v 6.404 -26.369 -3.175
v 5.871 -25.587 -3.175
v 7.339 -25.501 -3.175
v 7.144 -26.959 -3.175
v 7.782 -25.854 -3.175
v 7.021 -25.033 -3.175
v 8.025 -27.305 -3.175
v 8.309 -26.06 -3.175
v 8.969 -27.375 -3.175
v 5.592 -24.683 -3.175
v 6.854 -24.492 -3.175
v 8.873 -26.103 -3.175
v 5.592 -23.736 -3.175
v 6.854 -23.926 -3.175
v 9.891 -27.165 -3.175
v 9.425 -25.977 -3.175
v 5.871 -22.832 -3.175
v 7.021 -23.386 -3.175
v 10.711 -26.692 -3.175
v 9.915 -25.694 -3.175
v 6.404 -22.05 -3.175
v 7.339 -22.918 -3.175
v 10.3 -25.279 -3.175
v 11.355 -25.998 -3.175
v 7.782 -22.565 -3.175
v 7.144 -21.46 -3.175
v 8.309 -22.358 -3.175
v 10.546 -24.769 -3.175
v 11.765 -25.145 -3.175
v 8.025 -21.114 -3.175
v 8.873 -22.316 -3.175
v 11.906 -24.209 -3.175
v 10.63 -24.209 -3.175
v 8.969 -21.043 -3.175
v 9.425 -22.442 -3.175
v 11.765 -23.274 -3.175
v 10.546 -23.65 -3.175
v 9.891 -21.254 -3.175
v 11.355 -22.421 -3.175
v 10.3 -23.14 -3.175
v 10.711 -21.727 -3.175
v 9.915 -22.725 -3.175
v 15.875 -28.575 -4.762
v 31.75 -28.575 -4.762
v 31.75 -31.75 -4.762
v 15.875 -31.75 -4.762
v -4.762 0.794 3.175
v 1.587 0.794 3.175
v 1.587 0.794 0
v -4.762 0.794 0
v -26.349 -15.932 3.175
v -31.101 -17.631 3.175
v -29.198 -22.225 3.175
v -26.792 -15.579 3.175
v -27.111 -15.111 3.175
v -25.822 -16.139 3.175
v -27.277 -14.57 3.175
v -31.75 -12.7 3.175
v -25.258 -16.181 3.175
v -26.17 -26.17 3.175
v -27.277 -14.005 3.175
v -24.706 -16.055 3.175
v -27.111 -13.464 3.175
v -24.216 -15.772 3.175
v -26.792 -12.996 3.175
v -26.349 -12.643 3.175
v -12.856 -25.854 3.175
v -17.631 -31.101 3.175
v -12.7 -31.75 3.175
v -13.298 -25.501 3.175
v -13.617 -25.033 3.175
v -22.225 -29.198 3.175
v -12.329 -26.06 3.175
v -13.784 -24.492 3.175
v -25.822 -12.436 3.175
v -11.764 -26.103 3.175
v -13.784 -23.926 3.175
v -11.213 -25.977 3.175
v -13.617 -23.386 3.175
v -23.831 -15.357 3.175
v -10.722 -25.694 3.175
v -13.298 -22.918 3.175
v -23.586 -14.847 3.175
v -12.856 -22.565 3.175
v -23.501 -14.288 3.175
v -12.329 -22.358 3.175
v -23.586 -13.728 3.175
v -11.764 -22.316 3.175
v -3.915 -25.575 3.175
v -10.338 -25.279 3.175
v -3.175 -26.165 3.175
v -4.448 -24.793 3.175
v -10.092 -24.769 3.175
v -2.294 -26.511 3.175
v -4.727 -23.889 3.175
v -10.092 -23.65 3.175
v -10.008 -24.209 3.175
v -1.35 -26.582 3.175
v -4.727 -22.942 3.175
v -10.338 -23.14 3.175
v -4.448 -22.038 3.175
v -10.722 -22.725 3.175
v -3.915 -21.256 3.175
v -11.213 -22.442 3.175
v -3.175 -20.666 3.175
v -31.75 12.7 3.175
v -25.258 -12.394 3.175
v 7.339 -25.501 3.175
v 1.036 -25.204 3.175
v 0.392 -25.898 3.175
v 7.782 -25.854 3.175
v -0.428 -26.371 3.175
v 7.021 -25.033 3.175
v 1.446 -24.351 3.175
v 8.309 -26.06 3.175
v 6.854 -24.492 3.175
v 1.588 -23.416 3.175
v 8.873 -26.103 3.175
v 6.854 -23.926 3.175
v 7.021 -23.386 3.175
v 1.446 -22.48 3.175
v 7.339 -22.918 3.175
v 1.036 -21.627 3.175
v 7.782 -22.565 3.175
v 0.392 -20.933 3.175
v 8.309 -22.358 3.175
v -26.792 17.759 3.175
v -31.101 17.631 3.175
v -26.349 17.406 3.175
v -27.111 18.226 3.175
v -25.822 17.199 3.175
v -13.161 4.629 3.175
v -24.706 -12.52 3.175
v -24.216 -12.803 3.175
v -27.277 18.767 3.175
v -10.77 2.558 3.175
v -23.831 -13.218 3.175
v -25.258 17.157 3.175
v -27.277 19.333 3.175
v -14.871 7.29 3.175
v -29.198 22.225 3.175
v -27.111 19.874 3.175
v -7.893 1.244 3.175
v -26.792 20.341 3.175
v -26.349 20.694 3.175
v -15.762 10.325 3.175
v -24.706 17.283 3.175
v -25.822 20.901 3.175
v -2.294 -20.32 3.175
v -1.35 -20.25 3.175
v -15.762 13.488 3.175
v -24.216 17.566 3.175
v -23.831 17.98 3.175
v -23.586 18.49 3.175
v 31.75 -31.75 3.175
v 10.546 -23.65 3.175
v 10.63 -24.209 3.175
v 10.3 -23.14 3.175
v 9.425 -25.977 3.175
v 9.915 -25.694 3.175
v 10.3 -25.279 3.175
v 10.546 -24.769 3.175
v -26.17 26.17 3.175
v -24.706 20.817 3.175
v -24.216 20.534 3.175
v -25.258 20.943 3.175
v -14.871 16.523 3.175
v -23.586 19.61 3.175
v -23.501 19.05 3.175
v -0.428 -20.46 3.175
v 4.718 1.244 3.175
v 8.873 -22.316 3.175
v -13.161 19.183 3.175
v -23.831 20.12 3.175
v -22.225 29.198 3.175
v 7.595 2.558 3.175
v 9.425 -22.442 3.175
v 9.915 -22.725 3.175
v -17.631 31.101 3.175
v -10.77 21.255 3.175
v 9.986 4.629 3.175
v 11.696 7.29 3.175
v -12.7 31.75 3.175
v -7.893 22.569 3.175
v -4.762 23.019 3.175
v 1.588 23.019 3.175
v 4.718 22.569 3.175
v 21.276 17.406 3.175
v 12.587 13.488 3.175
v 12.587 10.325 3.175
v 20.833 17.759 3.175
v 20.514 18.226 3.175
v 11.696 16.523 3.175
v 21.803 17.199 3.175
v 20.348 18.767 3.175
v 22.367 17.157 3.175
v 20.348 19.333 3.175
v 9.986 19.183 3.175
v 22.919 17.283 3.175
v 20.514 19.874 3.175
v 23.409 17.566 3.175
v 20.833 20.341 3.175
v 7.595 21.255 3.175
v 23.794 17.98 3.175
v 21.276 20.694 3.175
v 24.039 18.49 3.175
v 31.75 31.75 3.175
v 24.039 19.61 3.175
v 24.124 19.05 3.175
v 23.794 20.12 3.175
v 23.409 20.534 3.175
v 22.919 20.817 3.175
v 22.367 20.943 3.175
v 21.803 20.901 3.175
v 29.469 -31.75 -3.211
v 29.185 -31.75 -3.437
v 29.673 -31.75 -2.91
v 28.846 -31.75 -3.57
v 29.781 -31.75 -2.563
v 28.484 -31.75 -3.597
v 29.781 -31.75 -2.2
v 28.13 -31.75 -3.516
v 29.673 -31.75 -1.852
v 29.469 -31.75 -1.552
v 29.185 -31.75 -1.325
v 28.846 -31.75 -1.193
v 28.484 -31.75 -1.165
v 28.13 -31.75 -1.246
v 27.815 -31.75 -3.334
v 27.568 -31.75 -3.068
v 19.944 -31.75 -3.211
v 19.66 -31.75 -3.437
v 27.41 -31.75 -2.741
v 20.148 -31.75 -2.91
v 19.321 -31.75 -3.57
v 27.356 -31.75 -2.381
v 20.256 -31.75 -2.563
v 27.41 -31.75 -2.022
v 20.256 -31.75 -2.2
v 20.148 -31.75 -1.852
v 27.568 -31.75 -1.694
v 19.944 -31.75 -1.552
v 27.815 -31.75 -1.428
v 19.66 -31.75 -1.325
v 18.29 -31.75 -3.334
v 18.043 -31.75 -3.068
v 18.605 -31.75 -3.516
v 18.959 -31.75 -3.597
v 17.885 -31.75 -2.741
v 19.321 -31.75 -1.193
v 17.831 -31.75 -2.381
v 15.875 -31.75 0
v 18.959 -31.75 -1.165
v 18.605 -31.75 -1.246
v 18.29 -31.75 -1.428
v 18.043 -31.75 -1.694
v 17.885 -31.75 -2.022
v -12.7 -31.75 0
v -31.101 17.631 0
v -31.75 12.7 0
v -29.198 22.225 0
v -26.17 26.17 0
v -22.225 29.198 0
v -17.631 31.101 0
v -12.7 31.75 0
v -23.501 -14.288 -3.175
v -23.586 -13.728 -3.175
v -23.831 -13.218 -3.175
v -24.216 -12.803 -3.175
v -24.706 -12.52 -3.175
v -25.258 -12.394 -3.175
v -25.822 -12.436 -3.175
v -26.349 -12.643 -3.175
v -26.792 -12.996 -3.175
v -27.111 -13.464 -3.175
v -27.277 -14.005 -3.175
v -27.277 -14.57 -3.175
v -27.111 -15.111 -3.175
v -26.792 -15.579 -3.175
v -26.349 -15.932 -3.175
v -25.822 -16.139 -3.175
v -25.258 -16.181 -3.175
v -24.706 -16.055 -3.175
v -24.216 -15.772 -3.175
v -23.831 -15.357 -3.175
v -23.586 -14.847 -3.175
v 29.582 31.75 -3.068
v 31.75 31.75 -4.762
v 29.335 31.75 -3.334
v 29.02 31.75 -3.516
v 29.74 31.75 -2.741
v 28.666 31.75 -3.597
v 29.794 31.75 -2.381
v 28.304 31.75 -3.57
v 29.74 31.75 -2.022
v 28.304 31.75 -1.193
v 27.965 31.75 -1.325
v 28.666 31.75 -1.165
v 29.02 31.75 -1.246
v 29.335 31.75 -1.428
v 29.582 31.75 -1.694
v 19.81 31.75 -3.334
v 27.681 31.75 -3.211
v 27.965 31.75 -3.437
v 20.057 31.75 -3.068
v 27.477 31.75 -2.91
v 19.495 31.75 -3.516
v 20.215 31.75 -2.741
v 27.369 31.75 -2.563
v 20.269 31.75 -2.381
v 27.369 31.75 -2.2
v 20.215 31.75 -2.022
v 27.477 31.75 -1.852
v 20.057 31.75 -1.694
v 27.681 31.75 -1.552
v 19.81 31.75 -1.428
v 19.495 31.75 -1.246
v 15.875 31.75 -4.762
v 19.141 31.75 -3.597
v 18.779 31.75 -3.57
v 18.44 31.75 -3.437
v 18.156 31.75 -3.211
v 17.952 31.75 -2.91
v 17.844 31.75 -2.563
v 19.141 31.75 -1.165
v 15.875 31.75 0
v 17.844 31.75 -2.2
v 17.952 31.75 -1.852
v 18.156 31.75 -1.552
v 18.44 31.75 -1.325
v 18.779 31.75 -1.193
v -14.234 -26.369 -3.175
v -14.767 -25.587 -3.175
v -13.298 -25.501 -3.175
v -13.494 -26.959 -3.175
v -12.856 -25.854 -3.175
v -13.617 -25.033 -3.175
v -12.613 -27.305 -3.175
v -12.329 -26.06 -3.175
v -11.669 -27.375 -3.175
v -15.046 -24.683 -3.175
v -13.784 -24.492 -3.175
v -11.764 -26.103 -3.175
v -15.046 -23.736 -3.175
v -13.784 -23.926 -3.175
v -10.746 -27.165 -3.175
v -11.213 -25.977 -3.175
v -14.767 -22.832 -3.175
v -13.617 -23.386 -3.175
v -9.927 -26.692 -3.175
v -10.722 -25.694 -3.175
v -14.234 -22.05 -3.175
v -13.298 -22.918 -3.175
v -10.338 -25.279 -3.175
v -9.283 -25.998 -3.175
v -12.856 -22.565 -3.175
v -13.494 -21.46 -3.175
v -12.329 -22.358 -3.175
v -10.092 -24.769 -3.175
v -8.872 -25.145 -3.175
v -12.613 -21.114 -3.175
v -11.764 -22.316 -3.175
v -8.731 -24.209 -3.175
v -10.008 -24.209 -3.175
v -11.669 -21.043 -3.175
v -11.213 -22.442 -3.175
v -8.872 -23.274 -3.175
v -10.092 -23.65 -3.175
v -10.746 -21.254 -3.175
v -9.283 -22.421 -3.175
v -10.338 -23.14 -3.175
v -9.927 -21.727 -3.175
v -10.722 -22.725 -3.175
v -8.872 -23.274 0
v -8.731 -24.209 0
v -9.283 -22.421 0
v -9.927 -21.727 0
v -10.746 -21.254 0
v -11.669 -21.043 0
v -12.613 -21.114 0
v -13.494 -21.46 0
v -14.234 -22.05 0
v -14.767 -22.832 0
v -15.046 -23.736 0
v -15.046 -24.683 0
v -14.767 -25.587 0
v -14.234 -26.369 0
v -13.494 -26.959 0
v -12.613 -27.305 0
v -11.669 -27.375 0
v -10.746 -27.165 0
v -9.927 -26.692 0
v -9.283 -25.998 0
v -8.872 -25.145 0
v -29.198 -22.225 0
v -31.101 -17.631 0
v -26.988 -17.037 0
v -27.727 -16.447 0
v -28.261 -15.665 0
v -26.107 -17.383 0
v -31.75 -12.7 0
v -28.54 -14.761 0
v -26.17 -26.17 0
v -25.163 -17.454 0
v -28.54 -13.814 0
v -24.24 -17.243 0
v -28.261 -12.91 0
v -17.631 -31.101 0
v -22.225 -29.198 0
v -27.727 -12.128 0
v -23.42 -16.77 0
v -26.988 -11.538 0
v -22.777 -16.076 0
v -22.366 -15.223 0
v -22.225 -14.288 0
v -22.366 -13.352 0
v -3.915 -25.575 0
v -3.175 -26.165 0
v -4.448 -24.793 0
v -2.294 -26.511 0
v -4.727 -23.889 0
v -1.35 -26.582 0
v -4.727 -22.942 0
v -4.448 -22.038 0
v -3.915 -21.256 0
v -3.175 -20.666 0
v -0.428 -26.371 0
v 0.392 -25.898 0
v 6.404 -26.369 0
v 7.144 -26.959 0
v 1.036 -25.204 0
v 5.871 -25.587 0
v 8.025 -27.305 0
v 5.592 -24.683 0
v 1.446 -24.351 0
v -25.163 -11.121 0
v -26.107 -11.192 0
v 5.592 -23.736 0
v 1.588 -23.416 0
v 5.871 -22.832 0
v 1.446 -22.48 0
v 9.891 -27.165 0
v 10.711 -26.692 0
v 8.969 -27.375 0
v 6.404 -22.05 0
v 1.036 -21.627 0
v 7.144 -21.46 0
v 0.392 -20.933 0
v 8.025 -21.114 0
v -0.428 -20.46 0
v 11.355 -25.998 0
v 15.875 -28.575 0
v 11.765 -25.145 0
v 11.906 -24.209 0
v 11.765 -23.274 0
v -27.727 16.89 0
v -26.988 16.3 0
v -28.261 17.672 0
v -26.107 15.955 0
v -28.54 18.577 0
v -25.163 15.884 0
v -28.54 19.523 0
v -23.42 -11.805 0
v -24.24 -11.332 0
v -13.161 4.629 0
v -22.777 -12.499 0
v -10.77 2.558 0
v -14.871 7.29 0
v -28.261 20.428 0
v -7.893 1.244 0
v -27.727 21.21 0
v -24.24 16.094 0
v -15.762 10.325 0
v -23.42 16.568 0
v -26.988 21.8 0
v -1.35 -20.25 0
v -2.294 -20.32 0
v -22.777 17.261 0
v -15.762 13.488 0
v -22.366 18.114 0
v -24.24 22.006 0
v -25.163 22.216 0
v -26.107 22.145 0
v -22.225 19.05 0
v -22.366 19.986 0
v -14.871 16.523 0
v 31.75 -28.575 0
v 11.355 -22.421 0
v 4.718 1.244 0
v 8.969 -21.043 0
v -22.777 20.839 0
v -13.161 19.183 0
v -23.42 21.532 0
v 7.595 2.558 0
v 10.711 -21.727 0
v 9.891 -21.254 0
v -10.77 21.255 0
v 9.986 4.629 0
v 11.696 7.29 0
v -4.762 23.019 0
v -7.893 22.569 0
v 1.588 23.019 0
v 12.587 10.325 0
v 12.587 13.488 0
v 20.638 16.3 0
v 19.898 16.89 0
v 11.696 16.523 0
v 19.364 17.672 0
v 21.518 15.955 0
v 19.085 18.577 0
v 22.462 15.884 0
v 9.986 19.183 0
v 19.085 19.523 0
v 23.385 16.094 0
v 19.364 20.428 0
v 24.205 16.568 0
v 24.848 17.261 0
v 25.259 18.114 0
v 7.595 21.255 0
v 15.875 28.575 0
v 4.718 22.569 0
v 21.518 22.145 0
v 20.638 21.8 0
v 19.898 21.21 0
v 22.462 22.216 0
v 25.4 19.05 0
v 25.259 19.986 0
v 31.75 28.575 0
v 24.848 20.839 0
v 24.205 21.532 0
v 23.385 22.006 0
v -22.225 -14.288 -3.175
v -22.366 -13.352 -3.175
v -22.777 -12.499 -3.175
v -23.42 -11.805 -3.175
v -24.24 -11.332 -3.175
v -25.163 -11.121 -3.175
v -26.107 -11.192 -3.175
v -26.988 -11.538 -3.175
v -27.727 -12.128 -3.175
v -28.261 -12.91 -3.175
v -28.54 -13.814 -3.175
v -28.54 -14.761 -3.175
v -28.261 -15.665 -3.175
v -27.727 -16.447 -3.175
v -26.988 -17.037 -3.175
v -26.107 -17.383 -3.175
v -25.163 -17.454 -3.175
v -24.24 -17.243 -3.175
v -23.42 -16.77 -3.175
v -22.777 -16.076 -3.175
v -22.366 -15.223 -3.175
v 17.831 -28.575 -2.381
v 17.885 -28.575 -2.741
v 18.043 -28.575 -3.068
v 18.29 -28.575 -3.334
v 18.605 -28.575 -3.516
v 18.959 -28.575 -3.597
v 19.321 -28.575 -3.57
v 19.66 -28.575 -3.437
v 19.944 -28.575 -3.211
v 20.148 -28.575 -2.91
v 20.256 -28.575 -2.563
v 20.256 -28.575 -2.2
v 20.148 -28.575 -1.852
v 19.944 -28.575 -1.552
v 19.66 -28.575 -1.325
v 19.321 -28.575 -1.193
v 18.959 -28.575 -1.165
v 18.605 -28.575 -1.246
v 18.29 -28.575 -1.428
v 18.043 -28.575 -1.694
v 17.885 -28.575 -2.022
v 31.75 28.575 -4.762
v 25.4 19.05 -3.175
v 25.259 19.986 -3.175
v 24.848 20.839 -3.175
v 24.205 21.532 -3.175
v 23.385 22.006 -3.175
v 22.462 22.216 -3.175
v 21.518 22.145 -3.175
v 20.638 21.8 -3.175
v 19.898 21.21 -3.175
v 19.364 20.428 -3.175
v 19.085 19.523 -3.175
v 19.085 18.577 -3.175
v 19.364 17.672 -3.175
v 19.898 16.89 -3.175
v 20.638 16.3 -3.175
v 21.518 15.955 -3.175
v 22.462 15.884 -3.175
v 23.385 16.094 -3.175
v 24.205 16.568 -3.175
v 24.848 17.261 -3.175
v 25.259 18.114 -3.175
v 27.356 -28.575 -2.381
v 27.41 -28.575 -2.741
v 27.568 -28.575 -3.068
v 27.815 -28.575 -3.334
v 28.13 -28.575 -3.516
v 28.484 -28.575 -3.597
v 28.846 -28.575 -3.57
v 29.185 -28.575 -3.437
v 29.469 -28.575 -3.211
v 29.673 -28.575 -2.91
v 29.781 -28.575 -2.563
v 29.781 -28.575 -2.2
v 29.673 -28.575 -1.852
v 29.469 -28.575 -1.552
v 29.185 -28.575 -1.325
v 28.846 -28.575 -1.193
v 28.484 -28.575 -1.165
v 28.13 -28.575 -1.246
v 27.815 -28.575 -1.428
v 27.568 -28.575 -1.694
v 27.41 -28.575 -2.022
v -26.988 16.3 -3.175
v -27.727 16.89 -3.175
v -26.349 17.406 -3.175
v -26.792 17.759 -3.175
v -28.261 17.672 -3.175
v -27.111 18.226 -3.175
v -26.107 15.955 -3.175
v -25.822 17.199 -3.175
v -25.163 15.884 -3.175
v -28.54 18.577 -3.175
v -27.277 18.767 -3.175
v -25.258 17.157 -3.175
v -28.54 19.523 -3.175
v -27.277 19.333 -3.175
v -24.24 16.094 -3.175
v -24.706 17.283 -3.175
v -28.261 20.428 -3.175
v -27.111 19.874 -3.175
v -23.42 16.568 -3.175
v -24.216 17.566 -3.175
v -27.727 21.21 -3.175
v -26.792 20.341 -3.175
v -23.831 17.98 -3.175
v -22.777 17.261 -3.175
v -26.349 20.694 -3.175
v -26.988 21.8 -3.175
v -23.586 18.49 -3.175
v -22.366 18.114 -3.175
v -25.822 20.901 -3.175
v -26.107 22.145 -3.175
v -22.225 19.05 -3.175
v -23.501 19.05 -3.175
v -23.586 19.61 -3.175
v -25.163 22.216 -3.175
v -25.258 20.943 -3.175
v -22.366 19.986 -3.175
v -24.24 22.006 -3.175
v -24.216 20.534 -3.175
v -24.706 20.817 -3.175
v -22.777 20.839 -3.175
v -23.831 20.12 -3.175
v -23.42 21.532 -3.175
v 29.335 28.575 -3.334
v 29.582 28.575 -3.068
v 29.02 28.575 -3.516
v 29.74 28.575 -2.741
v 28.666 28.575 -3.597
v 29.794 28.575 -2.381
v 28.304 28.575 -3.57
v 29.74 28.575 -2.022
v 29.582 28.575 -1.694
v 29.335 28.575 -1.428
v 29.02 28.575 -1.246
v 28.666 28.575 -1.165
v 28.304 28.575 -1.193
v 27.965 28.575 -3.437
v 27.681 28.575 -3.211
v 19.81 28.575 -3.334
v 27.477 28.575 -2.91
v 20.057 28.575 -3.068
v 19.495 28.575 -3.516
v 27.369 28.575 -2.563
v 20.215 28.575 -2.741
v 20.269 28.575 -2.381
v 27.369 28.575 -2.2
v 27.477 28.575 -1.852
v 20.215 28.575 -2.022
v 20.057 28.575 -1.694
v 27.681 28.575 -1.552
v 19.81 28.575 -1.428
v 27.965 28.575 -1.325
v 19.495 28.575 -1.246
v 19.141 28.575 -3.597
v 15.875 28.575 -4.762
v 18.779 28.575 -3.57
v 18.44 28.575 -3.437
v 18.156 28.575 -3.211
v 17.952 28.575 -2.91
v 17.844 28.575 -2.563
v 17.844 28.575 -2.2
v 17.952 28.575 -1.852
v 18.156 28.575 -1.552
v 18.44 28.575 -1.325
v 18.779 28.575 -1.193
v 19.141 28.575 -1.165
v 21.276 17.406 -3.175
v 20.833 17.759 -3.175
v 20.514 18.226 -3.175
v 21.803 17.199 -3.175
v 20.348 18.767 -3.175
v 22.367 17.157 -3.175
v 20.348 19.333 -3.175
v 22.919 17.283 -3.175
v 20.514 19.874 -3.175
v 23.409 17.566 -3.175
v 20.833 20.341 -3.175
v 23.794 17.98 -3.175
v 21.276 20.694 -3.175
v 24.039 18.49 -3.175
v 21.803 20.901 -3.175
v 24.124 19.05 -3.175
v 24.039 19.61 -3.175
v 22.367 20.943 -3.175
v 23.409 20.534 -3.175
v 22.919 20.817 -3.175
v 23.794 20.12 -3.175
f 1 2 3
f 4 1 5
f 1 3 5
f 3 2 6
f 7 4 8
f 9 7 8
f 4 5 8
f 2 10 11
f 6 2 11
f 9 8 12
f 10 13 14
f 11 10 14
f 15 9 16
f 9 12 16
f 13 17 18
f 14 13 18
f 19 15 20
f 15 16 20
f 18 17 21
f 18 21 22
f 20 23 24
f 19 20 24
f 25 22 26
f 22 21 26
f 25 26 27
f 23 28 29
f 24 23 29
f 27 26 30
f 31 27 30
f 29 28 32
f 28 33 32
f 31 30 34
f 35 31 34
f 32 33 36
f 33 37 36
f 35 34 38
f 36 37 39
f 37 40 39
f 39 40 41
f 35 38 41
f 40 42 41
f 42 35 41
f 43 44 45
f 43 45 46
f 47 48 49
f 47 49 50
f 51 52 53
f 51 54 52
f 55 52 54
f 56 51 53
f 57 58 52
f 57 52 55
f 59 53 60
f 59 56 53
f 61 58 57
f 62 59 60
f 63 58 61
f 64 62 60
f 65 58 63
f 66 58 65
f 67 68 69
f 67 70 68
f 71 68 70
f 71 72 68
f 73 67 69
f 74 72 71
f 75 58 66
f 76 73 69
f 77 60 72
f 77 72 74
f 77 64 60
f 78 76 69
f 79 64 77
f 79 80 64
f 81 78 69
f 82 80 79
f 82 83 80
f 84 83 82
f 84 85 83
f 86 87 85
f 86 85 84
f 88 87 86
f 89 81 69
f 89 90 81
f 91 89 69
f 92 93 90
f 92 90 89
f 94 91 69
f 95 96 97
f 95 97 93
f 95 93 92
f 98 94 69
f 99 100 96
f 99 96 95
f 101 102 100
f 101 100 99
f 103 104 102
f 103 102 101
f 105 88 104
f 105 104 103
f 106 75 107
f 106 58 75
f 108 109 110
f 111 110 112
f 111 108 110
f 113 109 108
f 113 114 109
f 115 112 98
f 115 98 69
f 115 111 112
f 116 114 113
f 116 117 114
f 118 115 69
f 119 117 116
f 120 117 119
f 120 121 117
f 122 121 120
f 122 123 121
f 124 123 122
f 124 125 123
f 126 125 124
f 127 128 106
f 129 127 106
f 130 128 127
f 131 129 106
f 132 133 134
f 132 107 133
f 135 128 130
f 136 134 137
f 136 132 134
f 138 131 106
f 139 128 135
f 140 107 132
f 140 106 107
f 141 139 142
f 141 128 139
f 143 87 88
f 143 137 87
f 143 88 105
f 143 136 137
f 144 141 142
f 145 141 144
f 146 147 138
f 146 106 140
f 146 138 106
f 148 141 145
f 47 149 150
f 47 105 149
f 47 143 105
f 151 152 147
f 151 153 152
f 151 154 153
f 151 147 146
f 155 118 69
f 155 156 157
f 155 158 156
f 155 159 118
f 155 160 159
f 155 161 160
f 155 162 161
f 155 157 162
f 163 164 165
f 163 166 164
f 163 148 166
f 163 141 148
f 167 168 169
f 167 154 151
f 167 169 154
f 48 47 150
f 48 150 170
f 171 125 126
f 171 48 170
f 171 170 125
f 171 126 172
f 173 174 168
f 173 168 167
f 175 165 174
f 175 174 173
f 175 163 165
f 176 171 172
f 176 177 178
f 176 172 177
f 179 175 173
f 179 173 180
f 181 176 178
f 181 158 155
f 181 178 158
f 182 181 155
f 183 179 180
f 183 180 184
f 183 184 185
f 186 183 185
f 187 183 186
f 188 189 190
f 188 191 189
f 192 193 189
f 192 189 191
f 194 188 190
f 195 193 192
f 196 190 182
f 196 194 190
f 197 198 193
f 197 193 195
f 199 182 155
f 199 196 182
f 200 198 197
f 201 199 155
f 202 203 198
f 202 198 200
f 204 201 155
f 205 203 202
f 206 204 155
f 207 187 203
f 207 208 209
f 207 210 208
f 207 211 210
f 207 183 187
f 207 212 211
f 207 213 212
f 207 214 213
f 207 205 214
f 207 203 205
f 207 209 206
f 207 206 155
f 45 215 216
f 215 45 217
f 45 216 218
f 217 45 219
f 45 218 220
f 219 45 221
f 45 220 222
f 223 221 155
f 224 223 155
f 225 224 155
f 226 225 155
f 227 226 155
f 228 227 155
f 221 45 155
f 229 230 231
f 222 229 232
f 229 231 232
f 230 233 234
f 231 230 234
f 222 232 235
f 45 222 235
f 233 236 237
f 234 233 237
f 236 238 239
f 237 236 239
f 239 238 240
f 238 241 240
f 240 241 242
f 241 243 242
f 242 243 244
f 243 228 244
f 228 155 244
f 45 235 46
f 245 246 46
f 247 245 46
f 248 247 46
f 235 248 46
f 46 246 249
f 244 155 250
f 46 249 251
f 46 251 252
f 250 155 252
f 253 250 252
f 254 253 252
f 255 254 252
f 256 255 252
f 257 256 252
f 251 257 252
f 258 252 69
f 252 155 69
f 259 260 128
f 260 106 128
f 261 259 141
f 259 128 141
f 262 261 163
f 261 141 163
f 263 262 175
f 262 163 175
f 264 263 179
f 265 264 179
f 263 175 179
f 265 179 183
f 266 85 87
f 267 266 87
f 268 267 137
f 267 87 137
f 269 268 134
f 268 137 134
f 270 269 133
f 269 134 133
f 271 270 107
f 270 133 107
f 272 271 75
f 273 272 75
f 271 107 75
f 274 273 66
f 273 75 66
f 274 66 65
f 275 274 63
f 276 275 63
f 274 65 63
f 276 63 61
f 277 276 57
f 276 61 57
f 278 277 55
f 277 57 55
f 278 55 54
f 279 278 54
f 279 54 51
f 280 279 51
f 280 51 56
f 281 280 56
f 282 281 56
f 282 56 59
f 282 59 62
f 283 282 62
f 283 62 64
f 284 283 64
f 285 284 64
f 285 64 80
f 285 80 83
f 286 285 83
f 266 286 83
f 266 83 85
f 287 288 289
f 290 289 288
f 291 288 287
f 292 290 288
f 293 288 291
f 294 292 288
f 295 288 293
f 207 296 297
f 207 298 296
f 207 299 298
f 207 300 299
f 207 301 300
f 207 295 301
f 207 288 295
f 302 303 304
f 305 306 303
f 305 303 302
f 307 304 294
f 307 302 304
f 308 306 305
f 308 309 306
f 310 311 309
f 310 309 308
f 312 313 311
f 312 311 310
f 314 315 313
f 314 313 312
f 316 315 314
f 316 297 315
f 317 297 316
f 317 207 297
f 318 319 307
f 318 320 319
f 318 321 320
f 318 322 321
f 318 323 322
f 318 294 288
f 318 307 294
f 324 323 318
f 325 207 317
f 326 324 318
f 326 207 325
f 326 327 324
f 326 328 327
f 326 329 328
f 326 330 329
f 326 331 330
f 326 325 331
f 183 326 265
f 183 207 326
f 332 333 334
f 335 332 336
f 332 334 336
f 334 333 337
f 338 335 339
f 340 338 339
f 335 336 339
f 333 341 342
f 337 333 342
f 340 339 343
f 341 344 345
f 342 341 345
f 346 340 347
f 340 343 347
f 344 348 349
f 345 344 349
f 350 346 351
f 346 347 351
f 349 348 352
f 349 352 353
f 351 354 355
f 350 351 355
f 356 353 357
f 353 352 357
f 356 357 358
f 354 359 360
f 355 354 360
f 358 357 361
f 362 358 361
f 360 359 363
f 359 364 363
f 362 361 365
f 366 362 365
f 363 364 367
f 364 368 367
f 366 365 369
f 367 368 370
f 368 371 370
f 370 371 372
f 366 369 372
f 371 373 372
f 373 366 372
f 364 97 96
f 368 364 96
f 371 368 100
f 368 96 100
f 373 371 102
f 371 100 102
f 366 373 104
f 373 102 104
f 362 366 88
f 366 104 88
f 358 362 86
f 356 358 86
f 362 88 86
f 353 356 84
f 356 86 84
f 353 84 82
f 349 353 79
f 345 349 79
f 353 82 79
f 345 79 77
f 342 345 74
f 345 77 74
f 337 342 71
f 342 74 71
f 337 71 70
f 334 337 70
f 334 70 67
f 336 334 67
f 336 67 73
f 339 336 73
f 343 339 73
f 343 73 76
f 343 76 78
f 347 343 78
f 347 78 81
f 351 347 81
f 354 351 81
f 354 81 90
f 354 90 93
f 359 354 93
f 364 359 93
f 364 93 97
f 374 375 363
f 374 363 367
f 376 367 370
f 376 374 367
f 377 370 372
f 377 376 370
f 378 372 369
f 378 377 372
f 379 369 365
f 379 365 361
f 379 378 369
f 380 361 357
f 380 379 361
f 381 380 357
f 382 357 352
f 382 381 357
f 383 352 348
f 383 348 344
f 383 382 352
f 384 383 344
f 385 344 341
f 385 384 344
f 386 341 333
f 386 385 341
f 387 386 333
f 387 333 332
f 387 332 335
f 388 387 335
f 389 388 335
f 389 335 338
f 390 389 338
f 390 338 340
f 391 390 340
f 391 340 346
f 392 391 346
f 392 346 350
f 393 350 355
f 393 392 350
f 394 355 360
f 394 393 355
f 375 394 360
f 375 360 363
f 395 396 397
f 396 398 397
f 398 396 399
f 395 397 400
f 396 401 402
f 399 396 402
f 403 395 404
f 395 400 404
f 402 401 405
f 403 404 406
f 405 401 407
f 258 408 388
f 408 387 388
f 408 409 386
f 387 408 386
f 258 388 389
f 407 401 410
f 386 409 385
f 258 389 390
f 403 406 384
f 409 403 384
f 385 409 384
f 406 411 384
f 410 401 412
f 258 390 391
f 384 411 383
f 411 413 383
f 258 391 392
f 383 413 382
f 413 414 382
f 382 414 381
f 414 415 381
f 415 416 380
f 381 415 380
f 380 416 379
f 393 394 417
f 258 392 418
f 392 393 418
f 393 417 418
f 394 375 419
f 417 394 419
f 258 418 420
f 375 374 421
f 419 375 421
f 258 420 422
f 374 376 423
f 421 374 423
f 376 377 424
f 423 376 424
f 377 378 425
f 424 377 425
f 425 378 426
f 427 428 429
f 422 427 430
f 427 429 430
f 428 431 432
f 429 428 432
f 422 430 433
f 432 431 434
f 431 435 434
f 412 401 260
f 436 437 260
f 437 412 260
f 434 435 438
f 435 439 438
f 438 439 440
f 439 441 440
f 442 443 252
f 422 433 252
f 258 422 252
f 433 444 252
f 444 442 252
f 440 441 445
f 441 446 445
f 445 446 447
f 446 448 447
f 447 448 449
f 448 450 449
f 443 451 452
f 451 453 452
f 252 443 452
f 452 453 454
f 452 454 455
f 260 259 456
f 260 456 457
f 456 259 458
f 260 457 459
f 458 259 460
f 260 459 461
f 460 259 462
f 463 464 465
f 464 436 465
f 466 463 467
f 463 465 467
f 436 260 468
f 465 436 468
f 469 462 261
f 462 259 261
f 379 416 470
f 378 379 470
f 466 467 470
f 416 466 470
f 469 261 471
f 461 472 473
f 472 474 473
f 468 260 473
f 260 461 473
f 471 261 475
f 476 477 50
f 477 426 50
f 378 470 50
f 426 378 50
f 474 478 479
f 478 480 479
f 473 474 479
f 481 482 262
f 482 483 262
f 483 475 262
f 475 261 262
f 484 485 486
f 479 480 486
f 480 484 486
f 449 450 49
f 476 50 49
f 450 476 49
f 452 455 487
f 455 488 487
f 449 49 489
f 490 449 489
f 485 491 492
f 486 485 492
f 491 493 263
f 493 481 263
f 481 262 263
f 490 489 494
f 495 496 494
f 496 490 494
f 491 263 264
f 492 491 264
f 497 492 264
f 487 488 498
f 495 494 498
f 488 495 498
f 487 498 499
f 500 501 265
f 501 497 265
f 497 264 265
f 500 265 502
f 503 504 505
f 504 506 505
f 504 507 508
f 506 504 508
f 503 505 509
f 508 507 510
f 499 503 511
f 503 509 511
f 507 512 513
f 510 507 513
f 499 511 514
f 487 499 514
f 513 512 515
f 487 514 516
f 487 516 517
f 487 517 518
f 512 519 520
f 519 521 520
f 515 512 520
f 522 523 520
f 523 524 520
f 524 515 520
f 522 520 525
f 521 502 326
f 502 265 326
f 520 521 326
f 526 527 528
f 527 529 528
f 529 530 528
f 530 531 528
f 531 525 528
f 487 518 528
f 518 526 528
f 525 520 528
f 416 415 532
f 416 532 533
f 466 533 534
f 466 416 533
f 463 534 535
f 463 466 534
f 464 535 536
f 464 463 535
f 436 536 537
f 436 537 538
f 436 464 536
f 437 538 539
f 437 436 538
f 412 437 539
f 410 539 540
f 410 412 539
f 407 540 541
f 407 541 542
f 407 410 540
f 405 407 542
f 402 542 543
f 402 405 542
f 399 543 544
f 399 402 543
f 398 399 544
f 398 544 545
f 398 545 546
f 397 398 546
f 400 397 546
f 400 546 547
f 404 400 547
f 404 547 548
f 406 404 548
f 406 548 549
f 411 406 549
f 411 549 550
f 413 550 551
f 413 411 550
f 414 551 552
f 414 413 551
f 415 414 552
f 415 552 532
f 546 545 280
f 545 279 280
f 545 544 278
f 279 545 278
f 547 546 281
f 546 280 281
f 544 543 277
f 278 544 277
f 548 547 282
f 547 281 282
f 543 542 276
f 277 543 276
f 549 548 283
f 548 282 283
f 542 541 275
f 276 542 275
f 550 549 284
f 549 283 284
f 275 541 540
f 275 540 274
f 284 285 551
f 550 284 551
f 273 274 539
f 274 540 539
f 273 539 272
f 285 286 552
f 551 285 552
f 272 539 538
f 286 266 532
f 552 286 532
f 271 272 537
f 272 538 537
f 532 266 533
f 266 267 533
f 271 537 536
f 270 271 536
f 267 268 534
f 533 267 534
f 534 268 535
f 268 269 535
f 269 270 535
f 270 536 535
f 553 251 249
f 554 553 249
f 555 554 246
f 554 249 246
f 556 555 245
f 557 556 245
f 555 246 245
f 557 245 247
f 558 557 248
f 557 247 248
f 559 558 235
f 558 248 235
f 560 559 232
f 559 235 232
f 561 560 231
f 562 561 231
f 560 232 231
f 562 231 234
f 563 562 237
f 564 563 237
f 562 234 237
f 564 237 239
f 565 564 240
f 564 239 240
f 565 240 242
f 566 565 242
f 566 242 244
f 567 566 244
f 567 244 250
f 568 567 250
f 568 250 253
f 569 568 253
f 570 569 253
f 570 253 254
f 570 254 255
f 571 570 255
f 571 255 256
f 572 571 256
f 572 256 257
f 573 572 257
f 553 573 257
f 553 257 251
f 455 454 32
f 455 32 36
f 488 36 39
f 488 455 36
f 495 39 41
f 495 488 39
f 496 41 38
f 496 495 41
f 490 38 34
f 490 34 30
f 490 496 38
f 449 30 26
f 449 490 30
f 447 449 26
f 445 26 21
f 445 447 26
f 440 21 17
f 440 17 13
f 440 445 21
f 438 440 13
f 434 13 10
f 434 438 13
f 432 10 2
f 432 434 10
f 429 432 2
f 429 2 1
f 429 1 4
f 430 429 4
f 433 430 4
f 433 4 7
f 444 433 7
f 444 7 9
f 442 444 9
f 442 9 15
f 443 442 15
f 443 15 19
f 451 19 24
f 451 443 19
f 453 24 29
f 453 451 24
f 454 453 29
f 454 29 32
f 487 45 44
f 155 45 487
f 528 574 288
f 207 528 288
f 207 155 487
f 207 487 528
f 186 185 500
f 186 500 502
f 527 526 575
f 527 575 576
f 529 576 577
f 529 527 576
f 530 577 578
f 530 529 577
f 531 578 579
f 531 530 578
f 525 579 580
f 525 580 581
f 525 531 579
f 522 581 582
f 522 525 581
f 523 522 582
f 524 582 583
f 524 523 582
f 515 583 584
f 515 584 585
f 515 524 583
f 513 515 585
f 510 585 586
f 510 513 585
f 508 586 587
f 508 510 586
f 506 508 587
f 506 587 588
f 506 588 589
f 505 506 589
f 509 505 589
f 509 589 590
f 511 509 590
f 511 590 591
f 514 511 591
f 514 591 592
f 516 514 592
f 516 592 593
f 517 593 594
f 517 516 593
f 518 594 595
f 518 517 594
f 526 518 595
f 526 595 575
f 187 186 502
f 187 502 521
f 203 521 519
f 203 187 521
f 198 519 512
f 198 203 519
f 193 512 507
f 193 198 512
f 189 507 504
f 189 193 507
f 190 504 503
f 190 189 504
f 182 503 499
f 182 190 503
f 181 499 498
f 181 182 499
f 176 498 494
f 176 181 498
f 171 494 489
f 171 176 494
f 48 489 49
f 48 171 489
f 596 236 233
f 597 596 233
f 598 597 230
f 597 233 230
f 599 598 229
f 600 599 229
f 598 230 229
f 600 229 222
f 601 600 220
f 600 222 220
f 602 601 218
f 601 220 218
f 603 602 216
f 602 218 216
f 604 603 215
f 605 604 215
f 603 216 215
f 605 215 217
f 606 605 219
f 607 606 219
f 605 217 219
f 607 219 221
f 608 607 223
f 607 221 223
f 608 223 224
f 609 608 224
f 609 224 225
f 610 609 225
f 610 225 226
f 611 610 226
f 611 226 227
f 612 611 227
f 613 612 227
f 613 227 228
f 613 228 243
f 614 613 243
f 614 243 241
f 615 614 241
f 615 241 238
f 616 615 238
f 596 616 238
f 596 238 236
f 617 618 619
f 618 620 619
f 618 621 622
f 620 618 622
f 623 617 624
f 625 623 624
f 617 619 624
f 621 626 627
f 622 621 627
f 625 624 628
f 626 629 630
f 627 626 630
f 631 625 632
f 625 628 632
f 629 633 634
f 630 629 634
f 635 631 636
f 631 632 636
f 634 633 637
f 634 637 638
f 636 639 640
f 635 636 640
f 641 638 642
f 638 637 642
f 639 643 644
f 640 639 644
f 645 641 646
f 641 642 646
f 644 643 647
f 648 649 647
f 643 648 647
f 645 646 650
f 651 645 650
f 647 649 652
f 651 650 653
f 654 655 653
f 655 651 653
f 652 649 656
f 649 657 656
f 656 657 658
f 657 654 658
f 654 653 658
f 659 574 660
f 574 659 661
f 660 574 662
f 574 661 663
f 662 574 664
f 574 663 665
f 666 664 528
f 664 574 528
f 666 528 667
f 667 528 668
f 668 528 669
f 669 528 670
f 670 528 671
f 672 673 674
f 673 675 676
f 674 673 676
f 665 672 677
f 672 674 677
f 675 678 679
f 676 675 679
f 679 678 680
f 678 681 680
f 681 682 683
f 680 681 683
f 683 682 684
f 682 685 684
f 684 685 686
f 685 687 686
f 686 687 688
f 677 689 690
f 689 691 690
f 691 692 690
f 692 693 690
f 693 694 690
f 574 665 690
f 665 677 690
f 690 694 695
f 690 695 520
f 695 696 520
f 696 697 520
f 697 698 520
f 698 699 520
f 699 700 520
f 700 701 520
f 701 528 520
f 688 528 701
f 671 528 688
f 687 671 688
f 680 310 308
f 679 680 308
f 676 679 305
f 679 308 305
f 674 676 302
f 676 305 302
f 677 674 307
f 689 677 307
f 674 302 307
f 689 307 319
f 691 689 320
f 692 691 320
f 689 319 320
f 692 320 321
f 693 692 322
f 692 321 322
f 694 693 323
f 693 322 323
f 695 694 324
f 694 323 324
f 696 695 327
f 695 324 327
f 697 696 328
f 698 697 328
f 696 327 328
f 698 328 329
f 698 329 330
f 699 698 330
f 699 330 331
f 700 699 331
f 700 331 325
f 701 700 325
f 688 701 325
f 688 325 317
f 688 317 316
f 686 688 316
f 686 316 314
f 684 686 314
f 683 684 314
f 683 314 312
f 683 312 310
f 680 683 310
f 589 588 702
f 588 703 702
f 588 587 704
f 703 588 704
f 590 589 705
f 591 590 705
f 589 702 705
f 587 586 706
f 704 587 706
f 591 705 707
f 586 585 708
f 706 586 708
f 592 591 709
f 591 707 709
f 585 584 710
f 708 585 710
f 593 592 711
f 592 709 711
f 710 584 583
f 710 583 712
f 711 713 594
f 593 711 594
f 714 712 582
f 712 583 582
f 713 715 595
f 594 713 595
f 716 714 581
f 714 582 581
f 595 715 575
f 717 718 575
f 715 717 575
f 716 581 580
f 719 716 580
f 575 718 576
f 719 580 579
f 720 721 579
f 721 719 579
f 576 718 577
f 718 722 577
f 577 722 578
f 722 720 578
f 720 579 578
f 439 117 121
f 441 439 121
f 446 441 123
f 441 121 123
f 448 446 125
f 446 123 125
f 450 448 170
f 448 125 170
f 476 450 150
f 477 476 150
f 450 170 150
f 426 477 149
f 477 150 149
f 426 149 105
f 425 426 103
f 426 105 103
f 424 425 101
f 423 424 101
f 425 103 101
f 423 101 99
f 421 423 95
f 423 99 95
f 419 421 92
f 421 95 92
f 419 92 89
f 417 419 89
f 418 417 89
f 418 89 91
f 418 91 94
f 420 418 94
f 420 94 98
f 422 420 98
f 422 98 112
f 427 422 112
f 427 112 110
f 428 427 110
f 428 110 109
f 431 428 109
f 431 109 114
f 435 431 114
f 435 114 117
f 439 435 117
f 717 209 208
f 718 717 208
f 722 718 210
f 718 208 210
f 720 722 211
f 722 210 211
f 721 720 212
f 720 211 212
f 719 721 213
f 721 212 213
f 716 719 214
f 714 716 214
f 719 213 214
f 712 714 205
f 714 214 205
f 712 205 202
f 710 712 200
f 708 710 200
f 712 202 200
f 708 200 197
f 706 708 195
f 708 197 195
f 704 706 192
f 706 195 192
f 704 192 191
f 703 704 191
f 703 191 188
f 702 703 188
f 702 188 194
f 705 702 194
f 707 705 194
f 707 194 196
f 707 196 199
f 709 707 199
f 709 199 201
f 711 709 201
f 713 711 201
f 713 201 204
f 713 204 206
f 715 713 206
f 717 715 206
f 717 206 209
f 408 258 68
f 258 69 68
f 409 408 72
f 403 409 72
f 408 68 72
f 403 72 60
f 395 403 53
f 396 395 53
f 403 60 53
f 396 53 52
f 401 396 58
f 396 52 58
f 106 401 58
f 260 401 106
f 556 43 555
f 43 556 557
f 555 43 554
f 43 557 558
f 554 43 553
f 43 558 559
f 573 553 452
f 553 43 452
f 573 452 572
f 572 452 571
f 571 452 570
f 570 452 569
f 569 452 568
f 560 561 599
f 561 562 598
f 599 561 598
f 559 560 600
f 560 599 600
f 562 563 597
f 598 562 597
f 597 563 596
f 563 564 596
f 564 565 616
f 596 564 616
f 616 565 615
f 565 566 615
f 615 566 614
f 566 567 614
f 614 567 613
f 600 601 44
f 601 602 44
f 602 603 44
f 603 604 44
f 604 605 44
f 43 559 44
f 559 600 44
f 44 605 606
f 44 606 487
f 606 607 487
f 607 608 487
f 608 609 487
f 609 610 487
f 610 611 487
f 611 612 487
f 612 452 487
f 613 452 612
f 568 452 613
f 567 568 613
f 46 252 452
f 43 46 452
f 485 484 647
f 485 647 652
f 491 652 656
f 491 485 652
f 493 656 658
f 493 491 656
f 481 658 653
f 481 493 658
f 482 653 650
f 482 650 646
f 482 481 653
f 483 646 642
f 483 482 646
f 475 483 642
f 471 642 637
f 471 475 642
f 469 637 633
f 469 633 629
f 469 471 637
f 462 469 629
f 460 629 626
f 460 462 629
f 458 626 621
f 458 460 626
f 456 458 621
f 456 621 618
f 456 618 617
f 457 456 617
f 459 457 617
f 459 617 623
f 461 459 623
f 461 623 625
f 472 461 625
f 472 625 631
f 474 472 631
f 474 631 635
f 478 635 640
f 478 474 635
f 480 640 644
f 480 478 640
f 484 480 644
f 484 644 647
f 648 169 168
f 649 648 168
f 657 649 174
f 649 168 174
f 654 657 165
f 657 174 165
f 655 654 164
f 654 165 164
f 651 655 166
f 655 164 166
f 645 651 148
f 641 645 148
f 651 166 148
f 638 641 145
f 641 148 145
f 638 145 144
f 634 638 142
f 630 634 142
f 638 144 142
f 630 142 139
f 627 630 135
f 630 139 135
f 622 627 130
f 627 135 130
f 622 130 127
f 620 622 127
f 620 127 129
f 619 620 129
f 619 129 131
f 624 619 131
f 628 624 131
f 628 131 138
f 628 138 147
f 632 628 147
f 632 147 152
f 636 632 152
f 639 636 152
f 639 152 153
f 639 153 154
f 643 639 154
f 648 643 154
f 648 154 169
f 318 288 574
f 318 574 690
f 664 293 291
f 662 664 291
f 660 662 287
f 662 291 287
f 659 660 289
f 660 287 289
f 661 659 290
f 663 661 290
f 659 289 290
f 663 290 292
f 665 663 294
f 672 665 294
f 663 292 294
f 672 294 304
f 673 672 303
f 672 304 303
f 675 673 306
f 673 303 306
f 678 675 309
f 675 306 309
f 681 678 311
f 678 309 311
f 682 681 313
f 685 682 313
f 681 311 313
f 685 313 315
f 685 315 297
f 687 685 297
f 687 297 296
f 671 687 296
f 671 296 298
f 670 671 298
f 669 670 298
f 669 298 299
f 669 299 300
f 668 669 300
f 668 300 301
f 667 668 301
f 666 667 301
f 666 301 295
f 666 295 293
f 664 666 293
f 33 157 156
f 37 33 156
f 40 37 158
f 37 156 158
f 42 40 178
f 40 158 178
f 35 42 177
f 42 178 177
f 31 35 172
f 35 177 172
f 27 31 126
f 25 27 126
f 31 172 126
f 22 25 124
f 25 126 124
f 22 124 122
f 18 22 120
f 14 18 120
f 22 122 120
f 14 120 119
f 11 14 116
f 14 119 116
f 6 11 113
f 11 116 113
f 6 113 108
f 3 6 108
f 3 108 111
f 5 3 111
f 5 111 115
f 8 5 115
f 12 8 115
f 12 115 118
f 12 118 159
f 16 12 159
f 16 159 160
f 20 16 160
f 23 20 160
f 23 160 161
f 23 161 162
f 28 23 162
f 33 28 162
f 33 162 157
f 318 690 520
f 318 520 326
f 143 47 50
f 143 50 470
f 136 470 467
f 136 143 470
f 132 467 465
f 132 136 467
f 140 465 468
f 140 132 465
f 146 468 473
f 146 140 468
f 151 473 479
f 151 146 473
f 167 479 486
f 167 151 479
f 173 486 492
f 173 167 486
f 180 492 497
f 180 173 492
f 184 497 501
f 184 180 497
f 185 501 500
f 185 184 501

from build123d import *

# Parameters (mm, degrees)
SKETCH1_W                 = 63.5
SKETCH1_H                 = 63.5
BOSS_EXTRUDE1_DEPTH       = 3.175
BOSS_EXTRUDE2_DEPTH       = 4.7625
F_2_CLEARANCE_HOLE1_D     = 2.4384
F_2_CLEARANCE_HOLE1_DEPTH = 3.175
FILLET1_R                 = 19.05
SKETCH5_W                 = 15.875
SKETCH5_H                 = 3.175
BOSS_EXTRUDE3_DEPTH       = 4.7625
F_2_CLEARANCE_HOLE2_D     = 2.4384
F_2_CLEARANCE_HOLE2_DEPTH = 3.175
BOSS_EXTRUDE4_START       = -3.175
SKETCH8_R                 = 3.175
BOSS_EXTRUDE4_DEPTH       = 3.175
F_6_CLEARANCE_HOLE1_D     = 3.7973
CUT_EXTRUDE1_REACH        = 9.938
SKETCH11_R                = 3.175


with BuildPart() as part:
    # Sketch1 → Boss-Extrude1 (new body)
    with BuildSketch(Plane.XY):
        Rectangle(SKETCH1_W, SKETCH1_H)
    extrude(amount=BOSS_EXTRUDE1_DEPTH)

    # Sketch2 → Boss-Extrude2 (add)
    with BuildSketch(Plane(origin=(0, 0, 0), x_dir=(-1, 0, 0), z_dir=(0, 0, -1))):
        Polygon((-25.4, -31.75), (-15.875, -31.75), (-15.875, -28.575), (-25.4, -28.575), (-31.75, -28.575), (-31.75, -31.75), align=None)
    extrude(amount=BOSS_EXTRUDE2_DEPTH)

    # #2 Clearance Hole1
    with Locations(Plane(origin=(0, -28.575, 0), x_dir=(1, 0, 0), z_dir=(0, 1, 0))):
        with Locations((28.575, 2.38125), (19.05, 2.38125)):
            Hole(F_2_CLEARANCE_HOLE1_D / 2, depth=F_2_CLEARANCE_HOLE1_DEPTH)

    # Fillet1
    fillet1_edges = [part.edges().sort_by_distance(p)[0] for p in [
        (-31.75, -31.75, 1.5875),
        (-31.75, 31.75, 1.5875),
    ]]
    fillet(fillet1_edges, radius=FILLET1_R)

    # Sketch5 → Boss-Extrude3 (add)
    with BuildSketch(Plane(origin=(0, 0, 0), x_dir=(-1, 0, 0), z_dir=(0, 0, -1))):
        with Locations((-23.8125, 30.1625)):
            Rectangle(SKETCH5_W, SKETCH5_H)
    extrude(amount=BOSS_EXTRUDE3_DEPTH)

    # #2 Clearance Hole2
    with Locations(Plane(origin=(0, 28.575, 0), x_dir=(-1, 0, 0), z_dir=(0, -1, 0))):
        with Locations((-19.05, 2.38125), (-28.575, 2.38125)):
            Hole(F_2_CLEARANCE_HOLE2_D / 2, depth=F_2_CLEARANCE_HOLE2_DEPTH)

    # Sketch8 → Boss-Extrude4 (add)
    with BuildSketch(Plane.XY.offset(3.175).offset(BOSS_EXTRUDE4_START)):
        with Locations((-25.4, 19.05)):
            Circle(SKETCH8_R)
        with Locations((-25.4, -14.2875)):
            Circle(SKETCH8_R)
        with Locations((22.225, 19.05)):
            Circle(SKETCH8_R)
        with Locations((8.73125, -24.209375)):
            Circle(SKETCH8_R)
        with Locations((-11.90625, -24.209375)):
            Circle(SKETCH8_R)
    extrude(amount=-BOSS_EXTRUDE4_DEPTH)

    # #6 Clearance Hole1 (through all)
    with Locations(Plane(origin=(0, 0, -3.175), x_dir=(-1, 0, 0), z_dir=(0, 0, -1))):
        with Locations((-22.225, 19.05), (25.4, 19.05), (25.4, -14.2875), (11.90625, -24.209375), (-8.73125, -24.209375)):
            Hole(F_6_CLEARANCE_HOLE1_D / 2)

    # Sketch11 → Cut-Extrude1 (cut, up to next)
    with BuildSketch(Plane.XY.offset(3.175), mode=Mode.PRIVATE) as cut_extrude1_sk1:
        with Locations((-1.5875, -23.415625)):
            Circle(SKETCH11_R)
    cut_extrude1_tool1 = extrude(cut_extrude1_sk1.sketch, amount=-CUT_EXTRUDE1_REACH, mode=Mode.PRIVATE) & part.part
    add(cut_extrude1_tool1.solids().sort_by_distance((-1.5875, -23.415625, 3.175))[0], mode=Mode.SUBTRACT)
    # Sketch11 → Cut-Extrude1 (cut, up to next)
    with BuildSketch(Plane.XY.offset(3.175), mode=Mode.PRIVATE) as cut_extrude1_sk2:
        with BuildLine():
            Line((-4.7625, 23.01875), (1.5875, 23.01875))
            ThreePointArc((1.5875, 23.01875), (12.7, 11.90625), (1.5875, 0.79375))
            Line((1.5875, 0.79375), (-4.7625, 0.79375))
            ThreePointArc((-4.7625, 0.79375), (-15.875, 11.90625), (-4.7625, 23.01875))
        make_face()
    cut_extrude1_tool2 = extrude(cut_extrude1_sk2.sketch, amount=-CUT_EXTRUDE1_REACH, mode=Mode.PRIVATE) & part.part
    add(cut_extrude1_tool2.solids().sort_by_distance((-1.5875, 11.90625, 3.175))[0], mode=Mode.SUBTRACT)


solid = part.part
